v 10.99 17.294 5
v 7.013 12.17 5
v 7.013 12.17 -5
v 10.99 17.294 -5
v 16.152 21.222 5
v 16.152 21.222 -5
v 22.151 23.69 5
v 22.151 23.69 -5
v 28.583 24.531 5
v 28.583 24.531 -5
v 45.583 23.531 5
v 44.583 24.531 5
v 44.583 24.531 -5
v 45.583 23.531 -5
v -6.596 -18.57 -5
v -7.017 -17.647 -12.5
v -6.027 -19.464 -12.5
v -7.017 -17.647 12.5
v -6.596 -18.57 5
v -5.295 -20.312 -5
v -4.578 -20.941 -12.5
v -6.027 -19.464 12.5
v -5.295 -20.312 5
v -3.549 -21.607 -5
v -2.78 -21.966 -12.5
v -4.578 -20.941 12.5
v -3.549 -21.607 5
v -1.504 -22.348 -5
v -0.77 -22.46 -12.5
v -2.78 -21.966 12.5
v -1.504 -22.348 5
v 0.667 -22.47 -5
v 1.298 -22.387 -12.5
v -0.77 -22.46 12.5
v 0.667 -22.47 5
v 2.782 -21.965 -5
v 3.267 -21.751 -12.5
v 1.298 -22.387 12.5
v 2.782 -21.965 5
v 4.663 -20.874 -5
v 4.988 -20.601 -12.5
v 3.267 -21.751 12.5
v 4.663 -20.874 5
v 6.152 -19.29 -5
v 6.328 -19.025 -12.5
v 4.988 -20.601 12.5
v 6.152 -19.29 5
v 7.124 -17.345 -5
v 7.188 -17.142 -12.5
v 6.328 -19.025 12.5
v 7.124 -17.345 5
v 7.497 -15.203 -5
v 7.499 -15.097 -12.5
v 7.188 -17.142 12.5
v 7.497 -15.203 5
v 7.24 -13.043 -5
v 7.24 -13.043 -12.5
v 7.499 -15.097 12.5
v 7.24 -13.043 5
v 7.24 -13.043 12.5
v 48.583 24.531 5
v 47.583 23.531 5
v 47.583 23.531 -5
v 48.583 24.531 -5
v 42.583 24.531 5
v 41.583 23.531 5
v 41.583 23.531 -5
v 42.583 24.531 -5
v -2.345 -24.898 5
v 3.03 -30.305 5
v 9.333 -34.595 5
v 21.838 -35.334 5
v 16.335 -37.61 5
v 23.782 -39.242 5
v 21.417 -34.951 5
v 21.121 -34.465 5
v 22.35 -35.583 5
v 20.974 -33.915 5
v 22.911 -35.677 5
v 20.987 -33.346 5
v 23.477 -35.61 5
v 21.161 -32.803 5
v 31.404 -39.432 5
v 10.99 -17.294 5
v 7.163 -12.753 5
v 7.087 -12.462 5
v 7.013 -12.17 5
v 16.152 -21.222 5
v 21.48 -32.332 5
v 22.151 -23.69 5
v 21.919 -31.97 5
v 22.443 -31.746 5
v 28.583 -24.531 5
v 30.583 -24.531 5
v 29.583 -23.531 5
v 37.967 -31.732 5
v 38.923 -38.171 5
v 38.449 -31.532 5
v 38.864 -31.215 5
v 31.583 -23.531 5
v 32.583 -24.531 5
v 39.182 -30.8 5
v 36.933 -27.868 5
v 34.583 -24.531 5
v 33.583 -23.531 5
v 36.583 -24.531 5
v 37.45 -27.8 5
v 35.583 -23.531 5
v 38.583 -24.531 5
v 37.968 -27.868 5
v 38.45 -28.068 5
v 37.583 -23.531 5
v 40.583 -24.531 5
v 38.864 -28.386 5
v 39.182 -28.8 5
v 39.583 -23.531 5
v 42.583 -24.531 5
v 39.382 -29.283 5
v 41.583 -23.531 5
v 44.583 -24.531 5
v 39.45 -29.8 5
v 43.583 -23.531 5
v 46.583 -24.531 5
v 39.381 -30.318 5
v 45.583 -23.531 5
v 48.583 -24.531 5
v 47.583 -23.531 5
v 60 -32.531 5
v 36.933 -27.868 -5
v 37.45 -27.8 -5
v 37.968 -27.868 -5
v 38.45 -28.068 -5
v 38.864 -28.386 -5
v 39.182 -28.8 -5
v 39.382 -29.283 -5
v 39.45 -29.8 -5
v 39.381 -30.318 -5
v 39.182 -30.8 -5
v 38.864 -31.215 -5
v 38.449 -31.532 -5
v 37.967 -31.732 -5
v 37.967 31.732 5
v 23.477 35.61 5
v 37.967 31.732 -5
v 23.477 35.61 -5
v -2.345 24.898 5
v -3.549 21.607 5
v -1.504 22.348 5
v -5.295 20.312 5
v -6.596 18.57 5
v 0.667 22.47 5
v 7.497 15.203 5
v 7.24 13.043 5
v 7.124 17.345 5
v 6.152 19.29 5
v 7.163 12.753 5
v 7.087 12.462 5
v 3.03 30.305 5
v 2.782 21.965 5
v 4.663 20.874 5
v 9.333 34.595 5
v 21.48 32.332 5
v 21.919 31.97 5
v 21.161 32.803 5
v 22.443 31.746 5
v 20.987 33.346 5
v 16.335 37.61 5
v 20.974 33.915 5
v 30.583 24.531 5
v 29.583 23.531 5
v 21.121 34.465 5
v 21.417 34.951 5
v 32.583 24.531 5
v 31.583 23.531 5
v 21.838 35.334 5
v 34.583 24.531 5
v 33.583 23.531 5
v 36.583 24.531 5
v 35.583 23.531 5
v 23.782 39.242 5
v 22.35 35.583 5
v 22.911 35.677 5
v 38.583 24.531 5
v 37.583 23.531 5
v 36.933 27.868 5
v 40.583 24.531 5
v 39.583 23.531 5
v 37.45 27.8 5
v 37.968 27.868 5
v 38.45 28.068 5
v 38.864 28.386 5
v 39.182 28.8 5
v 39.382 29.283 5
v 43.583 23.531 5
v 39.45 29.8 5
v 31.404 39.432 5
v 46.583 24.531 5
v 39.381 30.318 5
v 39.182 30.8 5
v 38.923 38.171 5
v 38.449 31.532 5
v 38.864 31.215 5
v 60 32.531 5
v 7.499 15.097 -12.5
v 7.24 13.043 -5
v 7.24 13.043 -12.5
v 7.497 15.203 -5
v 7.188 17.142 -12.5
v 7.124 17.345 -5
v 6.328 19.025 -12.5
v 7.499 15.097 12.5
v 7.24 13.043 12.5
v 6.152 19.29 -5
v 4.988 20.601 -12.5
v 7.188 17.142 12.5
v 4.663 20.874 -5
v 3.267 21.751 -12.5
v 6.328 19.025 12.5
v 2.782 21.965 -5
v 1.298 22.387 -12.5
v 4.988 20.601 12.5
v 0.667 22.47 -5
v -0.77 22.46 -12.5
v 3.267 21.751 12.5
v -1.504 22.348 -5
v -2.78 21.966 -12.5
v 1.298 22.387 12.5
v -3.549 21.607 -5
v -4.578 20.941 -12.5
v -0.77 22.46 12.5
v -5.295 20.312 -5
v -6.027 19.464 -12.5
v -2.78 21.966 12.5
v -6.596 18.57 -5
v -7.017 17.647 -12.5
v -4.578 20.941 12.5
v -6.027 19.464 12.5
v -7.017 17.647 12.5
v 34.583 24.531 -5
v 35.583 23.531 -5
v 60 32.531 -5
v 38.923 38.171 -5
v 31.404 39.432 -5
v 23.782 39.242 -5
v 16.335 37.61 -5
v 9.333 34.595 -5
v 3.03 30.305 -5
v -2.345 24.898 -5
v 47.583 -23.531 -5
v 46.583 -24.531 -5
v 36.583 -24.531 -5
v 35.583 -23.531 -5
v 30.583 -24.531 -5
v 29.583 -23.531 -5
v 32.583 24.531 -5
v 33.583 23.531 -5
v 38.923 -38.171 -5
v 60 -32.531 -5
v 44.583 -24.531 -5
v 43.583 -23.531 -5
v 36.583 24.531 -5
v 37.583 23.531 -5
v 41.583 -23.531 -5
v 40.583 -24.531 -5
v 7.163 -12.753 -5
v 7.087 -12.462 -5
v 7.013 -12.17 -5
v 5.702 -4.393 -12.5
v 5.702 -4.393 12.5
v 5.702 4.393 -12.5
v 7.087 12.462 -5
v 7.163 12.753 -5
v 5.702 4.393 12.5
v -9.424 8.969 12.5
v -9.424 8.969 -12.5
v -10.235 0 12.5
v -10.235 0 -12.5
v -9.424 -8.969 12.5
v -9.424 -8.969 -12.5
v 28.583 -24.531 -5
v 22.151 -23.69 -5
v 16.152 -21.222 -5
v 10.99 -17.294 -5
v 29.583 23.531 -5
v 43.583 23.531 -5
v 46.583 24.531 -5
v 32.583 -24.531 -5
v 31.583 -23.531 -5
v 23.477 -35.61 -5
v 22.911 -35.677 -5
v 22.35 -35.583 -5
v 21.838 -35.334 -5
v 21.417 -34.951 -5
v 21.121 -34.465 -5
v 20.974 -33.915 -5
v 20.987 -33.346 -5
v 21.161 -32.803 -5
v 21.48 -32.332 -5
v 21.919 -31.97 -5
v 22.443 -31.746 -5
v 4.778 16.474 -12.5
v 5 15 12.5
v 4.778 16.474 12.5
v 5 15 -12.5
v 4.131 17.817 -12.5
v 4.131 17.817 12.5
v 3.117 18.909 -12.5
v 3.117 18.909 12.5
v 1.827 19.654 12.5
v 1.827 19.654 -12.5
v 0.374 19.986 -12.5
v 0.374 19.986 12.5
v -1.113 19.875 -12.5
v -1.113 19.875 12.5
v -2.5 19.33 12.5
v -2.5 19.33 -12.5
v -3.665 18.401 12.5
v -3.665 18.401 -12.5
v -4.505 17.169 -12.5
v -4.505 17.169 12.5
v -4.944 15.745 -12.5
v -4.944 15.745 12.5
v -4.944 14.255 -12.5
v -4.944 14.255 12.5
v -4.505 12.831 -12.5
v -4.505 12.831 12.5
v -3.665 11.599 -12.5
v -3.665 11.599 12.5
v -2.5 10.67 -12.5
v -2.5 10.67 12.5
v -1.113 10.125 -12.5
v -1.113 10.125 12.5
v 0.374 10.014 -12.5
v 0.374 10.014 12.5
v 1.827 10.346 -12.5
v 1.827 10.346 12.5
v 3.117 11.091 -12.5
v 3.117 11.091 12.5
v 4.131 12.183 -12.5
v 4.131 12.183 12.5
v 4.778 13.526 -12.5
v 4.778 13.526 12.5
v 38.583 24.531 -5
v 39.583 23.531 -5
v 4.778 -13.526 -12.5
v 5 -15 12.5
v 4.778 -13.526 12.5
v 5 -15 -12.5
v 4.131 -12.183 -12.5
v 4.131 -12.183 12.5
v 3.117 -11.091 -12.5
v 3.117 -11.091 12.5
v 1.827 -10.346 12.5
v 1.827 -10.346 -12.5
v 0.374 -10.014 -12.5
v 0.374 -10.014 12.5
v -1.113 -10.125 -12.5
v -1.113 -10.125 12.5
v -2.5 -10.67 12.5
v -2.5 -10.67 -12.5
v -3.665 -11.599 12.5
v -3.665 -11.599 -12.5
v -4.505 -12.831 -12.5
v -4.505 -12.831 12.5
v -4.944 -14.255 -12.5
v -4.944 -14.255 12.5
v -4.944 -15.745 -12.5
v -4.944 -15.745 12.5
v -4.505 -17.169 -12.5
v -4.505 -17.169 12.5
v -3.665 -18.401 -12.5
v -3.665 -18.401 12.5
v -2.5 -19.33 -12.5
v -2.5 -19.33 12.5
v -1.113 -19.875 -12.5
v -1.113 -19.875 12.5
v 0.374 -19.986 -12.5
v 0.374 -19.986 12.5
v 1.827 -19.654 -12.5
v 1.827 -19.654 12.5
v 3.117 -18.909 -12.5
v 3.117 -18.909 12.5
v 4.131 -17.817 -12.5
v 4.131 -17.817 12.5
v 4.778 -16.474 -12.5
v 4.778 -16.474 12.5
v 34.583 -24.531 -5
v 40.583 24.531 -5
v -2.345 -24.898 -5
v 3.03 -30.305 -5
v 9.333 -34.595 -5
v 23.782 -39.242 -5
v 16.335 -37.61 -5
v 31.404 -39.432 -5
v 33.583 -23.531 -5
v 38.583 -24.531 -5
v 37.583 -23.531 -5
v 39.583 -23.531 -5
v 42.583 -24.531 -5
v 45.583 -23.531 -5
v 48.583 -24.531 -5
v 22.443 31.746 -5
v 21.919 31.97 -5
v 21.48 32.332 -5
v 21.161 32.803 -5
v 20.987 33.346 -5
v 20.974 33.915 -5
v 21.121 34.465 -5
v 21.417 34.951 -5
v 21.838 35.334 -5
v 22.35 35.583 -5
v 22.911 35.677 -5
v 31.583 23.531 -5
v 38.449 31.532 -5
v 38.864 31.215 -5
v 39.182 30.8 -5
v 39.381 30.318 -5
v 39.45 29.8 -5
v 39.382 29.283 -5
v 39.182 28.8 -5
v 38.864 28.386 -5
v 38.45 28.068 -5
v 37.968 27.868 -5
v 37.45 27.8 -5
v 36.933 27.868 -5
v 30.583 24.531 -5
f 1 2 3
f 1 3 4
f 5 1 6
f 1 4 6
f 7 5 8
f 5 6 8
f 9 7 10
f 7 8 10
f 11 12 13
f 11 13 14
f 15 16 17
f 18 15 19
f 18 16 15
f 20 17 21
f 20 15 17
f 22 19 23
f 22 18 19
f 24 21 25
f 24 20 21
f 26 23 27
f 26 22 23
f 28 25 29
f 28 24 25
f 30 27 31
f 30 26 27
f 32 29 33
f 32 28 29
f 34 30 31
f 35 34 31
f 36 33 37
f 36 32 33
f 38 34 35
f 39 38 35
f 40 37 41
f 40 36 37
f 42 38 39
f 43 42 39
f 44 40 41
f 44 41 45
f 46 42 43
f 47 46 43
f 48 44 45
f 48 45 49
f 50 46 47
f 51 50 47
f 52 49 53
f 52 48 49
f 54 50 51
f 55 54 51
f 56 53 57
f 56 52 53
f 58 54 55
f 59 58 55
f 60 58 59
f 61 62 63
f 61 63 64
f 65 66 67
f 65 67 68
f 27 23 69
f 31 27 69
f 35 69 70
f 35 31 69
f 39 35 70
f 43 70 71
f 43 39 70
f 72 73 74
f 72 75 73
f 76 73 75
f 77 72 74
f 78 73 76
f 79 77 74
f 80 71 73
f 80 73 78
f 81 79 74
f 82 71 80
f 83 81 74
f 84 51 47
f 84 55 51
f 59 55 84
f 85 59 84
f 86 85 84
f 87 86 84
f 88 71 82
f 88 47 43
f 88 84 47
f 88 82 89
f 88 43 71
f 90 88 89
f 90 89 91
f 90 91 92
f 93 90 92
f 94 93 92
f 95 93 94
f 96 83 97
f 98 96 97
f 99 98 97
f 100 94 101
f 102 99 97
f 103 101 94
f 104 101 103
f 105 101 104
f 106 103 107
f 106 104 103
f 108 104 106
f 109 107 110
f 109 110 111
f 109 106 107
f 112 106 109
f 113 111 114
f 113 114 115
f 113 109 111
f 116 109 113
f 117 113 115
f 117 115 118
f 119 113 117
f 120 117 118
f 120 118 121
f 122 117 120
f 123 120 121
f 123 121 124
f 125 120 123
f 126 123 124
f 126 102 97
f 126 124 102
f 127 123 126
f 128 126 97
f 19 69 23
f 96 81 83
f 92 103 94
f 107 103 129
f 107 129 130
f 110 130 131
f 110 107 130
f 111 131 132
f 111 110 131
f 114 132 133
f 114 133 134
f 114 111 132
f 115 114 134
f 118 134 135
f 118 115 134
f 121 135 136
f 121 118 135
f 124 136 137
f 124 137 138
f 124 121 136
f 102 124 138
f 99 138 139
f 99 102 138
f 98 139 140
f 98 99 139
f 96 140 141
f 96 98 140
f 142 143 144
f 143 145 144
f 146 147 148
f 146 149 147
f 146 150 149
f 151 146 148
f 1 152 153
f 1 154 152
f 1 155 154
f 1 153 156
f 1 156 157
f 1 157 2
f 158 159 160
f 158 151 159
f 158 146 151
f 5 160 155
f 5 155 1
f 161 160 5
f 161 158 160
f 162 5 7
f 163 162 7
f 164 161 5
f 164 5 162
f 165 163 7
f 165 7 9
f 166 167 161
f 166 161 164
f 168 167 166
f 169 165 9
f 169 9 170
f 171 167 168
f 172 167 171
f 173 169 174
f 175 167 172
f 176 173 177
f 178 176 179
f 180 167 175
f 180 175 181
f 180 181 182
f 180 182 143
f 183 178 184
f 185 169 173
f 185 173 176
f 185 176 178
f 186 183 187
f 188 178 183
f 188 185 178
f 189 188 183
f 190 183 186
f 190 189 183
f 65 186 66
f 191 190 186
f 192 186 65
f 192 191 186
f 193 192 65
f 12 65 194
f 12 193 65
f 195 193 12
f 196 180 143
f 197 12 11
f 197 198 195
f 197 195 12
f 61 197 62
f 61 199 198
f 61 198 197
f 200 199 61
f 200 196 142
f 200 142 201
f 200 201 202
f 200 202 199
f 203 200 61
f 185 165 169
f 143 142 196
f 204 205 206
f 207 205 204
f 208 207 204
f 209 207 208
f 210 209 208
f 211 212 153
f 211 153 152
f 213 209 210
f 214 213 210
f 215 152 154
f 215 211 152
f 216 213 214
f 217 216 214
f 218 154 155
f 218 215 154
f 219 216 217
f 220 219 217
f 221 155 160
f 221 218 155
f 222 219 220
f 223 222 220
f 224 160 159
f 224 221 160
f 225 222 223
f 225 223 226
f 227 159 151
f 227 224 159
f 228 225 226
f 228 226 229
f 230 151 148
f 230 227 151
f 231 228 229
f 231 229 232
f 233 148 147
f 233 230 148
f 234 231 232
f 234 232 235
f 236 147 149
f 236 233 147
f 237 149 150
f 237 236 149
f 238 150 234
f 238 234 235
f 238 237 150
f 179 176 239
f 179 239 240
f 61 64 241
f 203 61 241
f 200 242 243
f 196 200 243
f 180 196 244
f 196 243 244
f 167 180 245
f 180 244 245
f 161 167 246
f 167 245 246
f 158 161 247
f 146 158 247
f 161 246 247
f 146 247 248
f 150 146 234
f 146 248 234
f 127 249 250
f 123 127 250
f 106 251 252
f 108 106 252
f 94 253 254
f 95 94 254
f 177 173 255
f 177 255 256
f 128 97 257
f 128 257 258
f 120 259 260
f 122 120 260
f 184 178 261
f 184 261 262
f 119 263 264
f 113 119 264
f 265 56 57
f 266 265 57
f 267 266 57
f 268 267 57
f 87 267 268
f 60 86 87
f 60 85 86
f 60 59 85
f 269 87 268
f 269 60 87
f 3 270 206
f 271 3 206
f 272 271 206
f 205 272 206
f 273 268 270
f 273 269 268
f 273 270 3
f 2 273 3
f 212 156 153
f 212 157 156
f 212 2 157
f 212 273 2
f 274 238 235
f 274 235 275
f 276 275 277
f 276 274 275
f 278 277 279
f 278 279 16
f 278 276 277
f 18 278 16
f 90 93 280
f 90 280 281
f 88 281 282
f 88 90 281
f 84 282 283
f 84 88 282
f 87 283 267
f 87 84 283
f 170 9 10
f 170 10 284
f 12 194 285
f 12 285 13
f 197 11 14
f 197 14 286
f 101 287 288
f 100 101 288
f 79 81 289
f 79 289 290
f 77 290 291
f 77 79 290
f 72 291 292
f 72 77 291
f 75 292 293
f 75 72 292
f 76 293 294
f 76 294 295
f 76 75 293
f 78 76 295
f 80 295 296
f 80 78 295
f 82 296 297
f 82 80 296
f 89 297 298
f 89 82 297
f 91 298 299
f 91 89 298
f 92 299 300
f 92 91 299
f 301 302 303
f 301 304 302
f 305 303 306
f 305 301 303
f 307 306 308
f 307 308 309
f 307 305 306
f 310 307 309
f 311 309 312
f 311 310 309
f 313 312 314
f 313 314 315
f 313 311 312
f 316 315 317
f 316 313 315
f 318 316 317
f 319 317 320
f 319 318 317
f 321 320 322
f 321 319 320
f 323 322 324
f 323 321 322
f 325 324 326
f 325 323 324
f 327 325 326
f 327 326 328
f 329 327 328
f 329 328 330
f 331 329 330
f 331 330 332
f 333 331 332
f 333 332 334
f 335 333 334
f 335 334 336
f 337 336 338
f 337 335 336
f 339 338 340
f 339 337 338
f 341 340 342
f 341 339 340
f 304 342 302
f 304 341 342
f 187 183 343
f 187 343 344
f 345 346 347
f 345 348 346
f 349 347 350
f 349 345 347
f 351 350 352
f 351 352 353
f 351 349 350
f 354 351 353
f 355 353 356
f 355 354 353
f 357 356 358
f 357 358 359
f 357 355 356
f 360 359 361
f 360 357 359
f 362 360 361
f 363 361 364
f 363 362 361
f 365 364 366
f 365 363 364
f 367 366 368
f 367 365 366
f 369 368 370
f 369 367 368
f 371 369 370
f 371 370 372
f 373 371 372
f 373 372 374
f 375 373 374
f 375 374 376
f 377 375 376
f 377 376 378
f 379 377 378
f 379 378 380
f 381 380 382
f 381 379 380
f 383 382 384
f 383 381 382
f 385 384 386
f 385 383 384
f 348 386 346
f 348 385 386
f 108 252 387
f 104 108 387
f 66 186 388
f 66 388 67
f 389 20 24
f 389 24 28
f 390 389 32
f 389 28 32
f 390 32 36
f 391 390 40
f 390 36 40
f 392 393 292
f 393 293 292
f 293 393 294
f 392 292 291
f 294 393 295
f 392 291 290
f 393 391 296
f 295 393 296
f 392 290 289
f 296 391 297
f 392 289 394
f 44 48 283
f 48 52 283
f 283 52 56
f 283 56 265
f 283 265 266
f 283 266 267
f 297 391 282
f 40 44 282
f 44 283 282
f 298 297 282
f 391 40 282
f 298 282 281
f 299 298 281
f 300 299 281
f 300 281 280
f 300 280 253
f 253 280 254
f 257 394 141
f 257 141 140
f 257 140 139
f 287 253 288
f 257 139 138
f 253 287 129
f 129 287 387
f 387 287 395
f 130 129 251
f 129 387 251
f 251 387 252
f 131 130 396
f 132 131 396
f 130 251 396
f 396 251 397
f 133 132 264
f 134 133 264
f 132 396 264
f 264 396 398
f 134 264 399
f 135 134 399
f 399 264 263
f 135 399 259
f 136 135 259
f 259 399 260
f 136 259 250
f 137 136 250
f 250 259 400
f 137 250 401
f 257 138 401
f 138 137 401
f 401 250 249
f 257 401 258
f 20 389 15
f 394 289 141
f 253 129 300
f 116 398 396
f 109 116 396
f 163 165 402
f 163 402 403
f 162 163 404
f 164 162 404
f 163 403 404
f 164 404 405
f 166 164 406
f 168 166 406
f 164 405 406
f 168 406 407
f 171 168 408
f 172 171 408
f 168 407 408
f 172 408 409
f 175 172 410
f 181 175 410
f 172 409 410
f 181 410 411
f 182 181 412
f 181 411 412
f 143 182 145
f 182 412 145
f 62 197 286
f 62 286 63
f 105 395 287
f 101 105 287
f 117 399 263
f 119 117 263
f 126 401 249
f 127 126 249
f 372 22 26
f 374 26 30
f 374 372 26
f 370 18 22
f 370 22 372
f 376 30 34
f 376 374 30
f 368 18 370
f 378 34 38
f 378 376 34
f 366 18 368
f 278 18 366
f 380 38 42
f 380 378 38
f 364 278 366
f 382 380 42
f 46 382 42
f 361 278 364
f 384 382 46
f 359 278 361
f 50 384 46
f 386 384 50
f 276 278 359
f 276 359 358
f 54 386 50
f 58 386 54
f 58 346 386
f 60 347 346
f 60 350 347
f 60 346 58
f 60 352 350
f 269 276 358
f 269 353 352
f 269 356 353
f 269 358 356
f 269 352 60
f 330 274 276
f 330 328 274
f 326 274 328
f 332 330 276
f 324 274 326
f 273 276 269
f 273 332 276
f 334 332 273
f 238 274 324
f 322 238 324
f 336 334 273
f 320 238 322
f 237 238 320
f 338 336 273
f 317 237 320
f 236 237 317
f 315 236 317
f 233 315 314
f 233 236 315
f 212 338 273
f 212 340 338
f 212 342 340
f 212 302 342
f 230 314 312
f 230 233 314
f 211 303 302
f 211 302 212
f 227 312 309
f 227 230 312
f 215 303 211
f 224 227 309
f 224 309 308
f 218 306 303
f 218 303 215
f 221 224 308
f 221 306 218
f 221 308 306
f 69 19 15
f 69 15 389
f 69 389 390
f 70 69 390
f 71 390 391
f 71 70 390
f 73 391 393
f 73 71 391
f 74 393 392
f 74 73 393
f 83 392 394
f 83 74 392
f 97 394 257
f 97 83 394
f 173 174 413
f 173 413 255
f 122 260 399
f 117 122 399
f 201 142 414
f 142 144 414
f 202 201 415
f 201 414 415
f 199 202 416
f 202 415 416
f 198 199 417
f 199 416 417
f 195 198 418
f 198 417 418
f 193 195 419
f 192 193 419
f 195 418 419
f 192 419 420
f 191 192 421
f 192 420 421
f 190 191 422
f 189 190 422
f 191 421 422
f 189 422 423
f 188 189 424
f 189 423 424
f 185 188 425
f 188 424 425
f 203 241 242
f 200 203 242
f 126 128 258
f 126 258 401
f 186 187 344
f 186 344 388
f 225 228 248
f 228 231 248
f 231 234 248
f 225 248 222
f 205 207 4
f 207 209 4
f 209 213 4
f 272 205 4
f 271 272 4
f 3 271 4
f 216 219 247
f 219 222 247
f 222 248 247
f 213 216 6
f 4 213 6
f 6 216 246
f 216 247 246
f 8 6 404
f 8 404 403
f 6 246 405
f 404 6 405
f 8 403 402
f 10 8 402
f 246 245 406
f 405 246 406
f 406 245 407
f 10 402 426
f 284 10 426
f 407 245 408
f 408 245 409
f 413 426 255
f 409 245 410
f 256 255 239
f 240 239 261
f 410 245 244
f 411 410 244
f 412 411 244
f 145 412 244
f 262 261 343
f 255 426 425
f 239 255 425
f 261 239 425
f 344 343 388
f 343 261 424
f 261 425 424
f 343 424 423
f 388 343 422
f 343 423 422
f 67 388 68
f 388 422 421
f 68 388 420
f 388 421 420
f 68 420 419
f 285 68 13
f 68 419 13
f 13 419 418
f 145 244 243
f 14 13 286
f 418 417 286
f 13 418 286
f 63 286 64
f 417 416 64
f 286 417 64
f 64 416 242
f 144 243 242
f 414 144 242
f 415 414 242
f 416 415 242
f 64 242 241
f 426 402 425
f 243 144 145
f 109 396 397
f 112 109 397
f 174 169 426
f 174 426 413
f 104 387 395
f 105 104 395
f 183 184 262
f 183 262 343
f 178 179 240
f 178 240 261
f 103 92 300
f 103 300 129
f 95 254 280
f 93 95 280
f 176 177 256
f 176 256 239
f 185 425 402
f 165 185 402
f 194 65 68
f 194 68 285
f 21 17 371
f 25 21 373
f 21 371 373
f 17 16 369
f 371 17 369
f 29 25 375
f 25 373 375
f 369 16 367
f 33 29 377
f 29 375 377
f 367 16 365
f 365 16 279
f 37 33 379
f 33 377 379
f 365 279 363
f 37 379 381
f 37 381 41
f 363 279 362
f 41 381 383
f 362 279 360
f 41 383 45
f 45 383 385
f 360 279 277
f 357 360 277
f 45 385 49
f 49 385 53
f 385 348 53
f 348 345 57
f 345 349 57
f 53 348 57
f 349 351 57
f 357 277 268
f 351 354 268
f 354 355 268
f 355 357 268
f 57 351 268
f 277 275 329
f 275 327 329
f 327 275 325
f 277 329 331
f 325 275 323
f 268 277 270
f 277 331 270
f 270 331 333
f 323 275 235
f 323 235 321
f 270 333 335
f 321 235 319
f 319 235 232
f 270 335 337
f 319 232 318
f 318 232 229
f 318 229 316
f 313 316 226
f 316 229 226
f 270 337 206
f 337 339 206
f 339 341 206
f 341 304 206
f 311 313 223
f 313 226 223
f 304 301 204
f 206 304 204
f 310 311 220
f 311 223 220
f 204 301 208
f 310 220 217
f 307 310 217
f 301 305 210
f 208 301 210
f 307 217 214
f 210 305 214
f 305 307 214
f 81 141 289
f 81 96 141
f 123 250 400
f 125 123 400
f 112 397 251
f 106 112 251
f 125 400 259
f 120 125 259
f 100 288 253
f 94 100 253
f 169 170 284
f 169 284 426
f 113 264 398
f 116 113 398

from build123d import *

# Parameters (mm, degrees)
F0_R     = 5
F2_DEPTH = 12.5
F1_R     = 5
F3_DEPTH = 5


# Not quite as in the source:
# - a feature of the source that left no trace in its solid (it failed there, or was rolled back) is left out


with BuildPart() as f2:
    # F0 (on Top) → F2 (new body, symmetric)
    with BuildSketch(Plane.XY):
        with BuildLine():
            ThreePointArc((7.2403054276, -13.0434782609), (5.5090082779, 0), (7.2403054276, 13.0434782609))
            ThreePointArc((7.2403054276, 13.0434782609), (2.3044883911, 22.1371796429), (-7.0173413473, 17.6470588235))
            ThreePointArc((-7.0173413473, 17.6470588235), (-10.2350656985, 0), (-7.0173413473, -17.6470588235))
            ThreePointArc((-7.0173413473, -17.6470588235), (2.3044883911, -22.1371796429), (7.2403054276, -13.0434782609))
        make_face()
        with Locations((0, -15)):
            Circle(F0_R, mode=Mode.SUBTRACT)
        with Locations((0, 15)):
            Circle(F0_R, mode=Mode.SUBTRACT)
    extrude(amount=F2_DEPTH, both=True)

    # F1 (on Top) → F3 (join, symmetric)
    with BuildSketch(Plane.XY):
        with BuildLine():
            ThreePointArc((38.9229935461, 38.1714845638), (12.7620087728, 36.2695311392), (-6.5959822677, 18.5697363943))
            ThreePointArc((-6.5959822677, 18.5697363943), (-3.5697363943, 8.4040177323), (6.5959822677, 11.4302636057))
            ThreePointArc((6.5959822677, 11.4302636057), (15.785676778, 21.0076181762), (28.5825898266, 24.5311422915))
            Line((28.5825898266, 24.5311422915), (30.5825898266, 24.5311422915))
            Line((30.5825898266, 24.5311422915), (32.5825898266, 24.5311422915))
            Line((32.5825898266, 24.5311422915), (34.5825898266, 24.5311422915))
            Line((34.5825898266, 24.5311422915), (36.5825898266, 24.5311422915))
            Line((36.5825898266, 24.5311422915), (38.5825898266, 24.5311422915))
            Line((38.5825898266, 24.5311422915), (40.5825898266, 24.5311422915))
            Line((40.5825898266, 24.5311422915), (42.5825898266, 24.5311422915))
            Line((42.5825898266, 24.5311422915), (44.5825898266, 24.5311422915))
            Line((44.5825898266, 24.5311422915), (46.5825898266, 24.5311422915))
            Line((46.5825898266, 24.5311422915), (48.5825898266, 24.5311422915))
            Line((48.5825898266, 24.5311422915), (60, 32.5311422915))
            Line((60, 32.5311422915), (38.9229935461, 38.1714845638))
        make_face()
        with Locations((0, 15)):
            Circle(F1_R, mode=Mode.SUBTRACT)
        with BuildLine():
            ThreePointArc((22.4425128865, 31.74578129), (21.0275159589, 34.1948185896), (23.4765532585, 35.6098155172))
            Line((23.4765532585, 35.6098155172), (37.9666816106, 31.7321641224))
            ThreePointArc((37.9666816106, 31.7321641224), (39.0361733804, 31.017923595), (39.4496614246, 29.8001470088))
            ThreePointArc((39.4496614246, 29.8001470088), (38.6674380108, 28.2136350529), (36.9326412386, 27.8681298951))
            Line((36.9326412386, 27.8681298951), (22.4425128865, 31.74578129))
        make_face(mode=Mode.SUBTRACT)
        with BuildLine():
            Line((32.5825898266, -24.5311422915), (30.5825898266, -24.5311422915))
            Line((30.5825898266, -24.5311422915), (28.5825898266, -24.5311422915))
            ThreePointArc((28.5825898266, -24.5311422915), (15.785676778, -21.0076181762), (6.5959822677, -11.4302636057))
            ThreePointArc((6.5959822677, -11.4302636057), (-3.5697363943, -8.4040177323), (-6.5959822677, -18.5697363943))
            ThreePointArc((-6.5959822677, -18.5697363943), (12.7620087728, -36.2695311392), (38.9229935461, -38.1714845638))
            Line((38.9229935461, -38.1714845638), (60, -32.5311422915))
            Line((60, -32.5311422915), (48.5825898266, -24.5311422915))
            Line((48.5825898266, -24.5311422915), (46.5825898266, -24.5311422915))
            Line((46.5825898266, -24.5311422915), (44.5825898266, -24.5311422915))
            Line((44.5825898266, -24.5311422915), (42.5825898266, -24.5311422915))
            Line((42.5825898266, -24.5311422915), (40.5825898266, -24.5311422915))
            Line((40.5825898266, -24.5311422915), (38.5825898266, -24.5311422915))
            Line((38.5825898266, -24.5311422915), (36.5825898266, -24.5311422915))
            Line((36.5825898266, -24.5311422915), (34.5825898266, -24.5311422915))
            Line((34.5825898266, -24.5311422915), (32.5825898266, -24.5311422915))
        make_face()
        with Locations((0, -15)):
            Circle(F1_R, mode=Mode.SUBTRACT)
        with BuildLine():
            ThreePointArc((23.4765532585, -35.6098155172), (21.0275159589, -34.1948185896), (22.4425128865, -31.74578129))
            Line((22.4425128865, -31.74578129), (36.9326412386, -27.8681298951))
            ThreePointArc((36.9326412386, -27.8681298951), (38.6674380108, -28.2136350529), (39.4496614246, -29.8001470088))
            ThreePointArc((39.4496614246, -29.8001470088), (39.0361733804, -31.017923595), (37.9666816106, -31.7321641224))
            Line((37.9666816106, -31.7321641224), (23.4765532585, -35.6098155172))
        make_face(mode=Mode.SUBTRACT)
        Polygon((30.5825898266, 24.5311422915), (28.5825898266, 24.5311422915), (29.5825898266, 23.5311422915), align=None)
        Polygon((32.5825898266, 24.5311422915), (30.5825898266, 24.5311422915), (31.5825898266, 23.5311422915), align=None)
        Polygon((34.5825898266, 24.5311422915), (32.5825898266, 24.5311422915), (33.5825898266, 23.5311422915), align=None)
        Polygon((36.5825898266, 24.5311422915), (34.5825898266, 24.5311422915), (35.5825898266, 23.5311422915), align=None)
        Polygon((38.5825898266, 24.5311422915), (36.5825898266, 24.5311422915), (37.5825898266, 23.5311422915), align=None)
        Polygon((40.5825898266, 24.5311422915), (38.5825898266, 24.5311422915), (39.5825898266, 23.5311422915), align=None)
        Polygon((41.5825898266, 23.5311422915), (42.5825898266, 24.5311422915), (40.5825898266, 24.5311422915), align=None)
        Polygon((43.5825898266, 23.5311422915), (44.5825898266, 24.5311422915), (42.5825898266, 24.5311422915), align=None)
        Polygon((45.5825898266, 23.5311422915), (46.5825898266, 24.5311422915), (44.5825898266, 24.5311422915), align=None)
        Polygon((47.5825898266, 23.5311422915), (48.5825898266, 24.5311422915), (46.5825898266, 24.5311422915), align=None)
        Polygon((30.5825898266, -24.5311422915), (29.5825898266, -23.5311422915), (28.5825898266, -24.5311422915), align=None)
        Polygon((31.5825898266, -23.5311422915), (30.5825898266, -24.5311422915), (32.5825898266, -24.5311422915), align=None)
        Polygon((33.5825898266, -23.5311422915), (32.5825898266, -24.5311422915), (34.5825898266, -24.5311422915), align=None)
        Polygon((35.5825898266, -23.5311422915), (34.5825898266, -24.5311422915), (36.5825898266, -24.5311422915), align=None)
        Polygon((37.5825898266, -23.5311422915), (36.5825898266, -24.5311422915), (38.5825898266, -24.5311422915), align=None)
        Polygon((39.5825898266, -23.5311422915), (38.5825898266, -24.5311422915), (40.5825898266, -24.5311422915), align=None)
        Polygon((41.5825898266, -23.5311422915), (40.5825898266, -24.5311422915), (42.5825898266, -24.5311422915), align=None)
        Polygon((43.5825898266, -23.5311422915), (42.5825898266, -24.5311422915), (44.5825898266, -24.5311422915), align=None)
        Polygon((44.5825898266, -24.5311422915), (46.5825898266, -24.5311422915), (45.5825898266, -23.5311422915), align=None)
        Polygon((46.5825898266, -24.5311422915), (48.5825898266, -24.5311422915), (47.5825898266, -23.5311422915), align=None)
    extrude(amount=F3_DEPTH, both=True)


solid = f2.part
